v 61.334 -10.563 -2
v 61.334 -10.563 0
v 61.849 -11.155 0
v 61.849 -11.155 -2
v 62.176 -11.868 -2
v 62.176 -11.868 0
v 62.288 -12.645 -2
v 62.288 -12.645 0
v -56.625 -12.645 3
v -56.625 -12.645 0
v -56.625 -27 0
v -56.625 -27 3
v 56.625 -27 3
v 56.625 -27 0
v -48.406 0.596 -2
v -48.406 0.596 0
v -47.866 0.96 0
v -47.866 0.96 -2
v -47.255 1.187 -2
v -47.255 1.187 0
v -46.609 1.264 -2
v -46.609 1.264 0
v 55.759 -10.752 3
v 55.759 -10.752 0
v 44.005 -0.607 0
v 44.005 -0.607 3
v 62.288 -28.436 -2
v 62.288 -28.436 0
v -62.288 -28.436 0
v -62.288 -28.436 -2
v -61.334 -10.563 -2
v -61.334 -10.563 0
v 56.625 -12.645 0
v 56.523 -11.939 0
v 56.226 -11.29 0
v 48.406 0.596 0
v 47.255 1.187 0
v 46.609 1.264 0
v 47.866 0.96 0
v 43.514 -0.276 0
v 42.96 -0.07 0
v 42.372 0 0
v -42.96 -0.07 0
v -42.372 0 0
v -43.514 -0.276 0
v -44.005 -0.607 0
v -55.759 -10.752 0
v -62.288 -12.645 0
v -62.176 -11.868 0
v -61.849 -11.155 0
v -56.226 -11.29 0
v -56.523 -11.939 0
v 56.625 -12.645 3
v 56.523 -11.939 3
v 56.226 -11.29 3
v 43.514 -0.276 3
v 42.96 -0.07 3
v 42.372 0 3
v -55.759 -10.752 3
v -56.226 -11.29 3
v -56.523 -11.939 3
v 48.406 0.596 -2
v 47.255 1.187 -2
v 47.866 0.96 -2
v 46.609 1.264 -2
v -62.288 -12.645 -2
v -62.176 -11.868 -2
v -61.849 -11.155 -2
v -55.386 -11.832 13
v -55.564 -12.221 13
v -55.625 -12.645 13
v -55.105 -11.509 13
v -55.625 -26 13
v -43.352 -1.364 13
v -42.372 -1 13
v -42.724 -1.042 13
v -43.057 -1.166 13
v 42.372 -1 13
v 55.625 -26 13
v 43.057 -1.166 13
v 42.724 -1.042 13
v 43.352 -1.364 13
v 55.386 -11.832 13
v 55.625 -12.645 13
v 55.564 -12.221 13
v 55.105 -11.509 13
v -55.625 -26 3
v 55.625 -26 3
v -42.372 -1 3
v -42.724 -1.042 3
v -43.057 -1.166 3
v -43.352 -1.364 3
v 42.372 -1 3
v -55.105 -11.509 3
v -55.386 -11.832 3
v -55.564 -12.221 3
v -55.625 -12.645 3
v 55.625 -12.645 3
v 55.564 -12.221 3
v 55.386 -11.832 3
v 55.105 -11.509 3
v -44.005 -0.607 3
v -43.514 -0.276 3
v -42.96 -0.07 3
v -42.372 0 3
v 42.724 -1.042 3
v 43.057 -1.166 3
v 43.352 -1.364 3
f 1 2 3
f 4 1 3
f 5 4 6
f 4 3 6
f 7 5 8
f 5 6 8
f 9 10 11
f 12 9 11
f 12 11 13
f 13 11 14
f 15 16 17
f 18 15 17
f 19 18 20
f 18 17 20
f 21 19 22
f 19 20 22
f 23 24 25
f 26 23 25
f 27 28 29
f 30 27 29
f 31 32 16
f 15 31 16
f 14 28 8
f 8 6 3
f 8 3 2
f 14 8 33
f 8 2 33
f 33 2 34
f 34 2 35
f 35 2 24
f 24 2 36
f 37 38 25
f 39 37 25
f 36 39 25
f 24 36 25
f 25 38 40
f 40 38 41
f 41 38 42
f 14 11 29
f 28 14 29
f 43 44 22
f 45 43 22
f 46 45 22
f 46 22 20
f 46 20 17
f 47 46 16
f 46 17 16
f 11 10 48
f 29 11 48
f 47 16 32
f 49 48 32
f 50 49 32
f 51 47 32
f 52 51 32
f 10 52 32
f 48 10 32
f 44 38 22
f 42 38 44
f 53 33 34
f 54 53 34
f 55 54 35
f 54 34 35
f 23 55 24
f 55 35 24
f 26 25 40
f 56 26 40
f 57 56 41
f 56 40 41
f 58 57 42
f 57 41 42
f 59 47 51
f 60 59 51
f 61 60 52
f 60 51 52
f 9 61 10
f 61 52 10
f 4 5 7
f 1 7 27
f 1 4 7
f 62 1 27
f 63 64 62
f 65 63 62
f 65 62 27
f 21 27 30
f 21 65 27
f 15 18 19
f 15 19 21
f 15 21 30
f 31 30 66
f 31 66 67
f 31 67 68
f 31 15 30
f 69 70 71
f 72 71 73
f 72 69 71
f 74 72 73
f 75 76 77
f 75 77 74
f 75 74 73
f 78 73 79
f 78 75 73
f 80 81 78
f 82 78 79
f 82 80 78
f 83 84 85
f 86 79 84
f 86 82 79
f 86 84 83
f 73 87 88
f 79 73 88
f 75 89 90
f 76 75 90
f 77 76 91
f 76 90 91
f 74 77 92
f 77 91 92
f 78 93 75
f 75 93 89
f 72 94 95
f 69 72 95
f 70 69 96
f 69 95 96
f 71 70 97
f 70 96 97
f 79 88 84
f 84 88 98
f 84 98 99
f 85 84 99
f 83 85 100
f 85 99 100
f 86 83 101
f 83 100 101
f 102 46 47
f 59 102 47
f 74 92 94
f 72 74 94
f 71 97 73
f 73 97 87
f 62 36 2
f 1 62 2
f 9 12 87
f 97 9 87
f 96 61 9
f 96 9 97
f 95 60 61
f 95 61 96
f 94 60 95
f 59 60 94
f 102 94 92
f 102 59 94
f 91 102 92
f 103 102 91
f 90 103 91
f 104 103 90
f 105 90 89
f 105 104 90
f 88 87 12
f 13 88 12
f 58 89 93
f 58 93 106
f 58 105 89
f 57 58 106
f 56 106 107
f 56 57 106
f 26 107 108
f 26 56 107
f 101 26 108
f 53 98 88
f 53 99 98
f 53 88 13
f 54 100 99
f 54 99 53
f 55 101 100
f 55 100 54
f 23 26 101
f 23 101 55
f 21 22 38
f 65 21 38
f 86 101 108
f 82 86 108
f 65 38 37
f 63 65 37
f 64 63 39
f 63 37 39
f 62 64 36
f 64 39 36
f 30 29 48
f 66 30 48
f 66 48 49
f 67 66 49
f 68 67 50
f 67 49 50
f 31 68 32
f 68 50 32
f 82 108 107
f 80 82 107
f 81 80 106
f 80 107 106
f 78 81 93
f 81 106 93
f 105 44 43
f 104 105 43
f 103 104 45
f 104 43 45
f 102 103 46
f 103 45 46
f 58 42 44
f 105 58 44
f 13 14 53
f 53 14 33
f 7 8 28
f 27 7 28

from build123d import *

# Parameters (mm, degrees)
BOSS_EXTRUDE1_DEPTH = 3
BOSS_EXTRUDE4_DEPTH = 10
BOSS_EXTRUDE5_DEPTH = 2


with BuildPart() as part:
    # Sketch2 → Boss-Extrude1 (new body)
    with BuildSketch(Plane(origin=(0, 3, 0), x_dir=(1, 0, 0), z_dir=(0, 0, 1))):
        with BuildLine():
            Line((-56.625, -30), (56.625, -30))
            Line((56.625, -30), (56.625, -15.644630074))
            ThreePointArc((56.625, -15.644630074), (56.398076263, -14.603897494), (55.758500558, -13.752098455))
            Line((55.758500558, -13.752098455), (44.005193779, -3.607468381))
            ThreePointArc((44.005193779, -3.607468381), (43.243091796, -3.156783296), (42.371693222, -3))
            Line((42.371693222, -3), (-42.371693222, -3))
            ThreePointArc((-42.371693222, -3), (-43.243091796, -3.156783296), (-44.005193779, -3.607468381))
            Line((-44.005193779, -3.607468381), (-55.758500558, -13.752098455))
            ThreePointArc((-55.758500558, -13.752098455), (-56.398076263, -14.603897494), (-56.625, -15.644630074))
            Line((-56.625, -15.644630074), (-56.625, -30))
        make_face()
    extrude(amount=BOSS_EXTRUDE1_DEPTH)

    # Sketch5 → Boss-Extrude4 (add)
    with BuildSketch(Plane.XY.offset(3)):
        with BuildLine():
            Line((55.625, -26), (55.625, -12.644630074))
            ThreePointArc((55.625, -12.644630074), (55.488845758, -12.020190526), (55.105100335, -11.509111102))
            Line((55.105100335, -11.509111102), (43.351793556, -1.364481029))
            ThreePointArc((43.351793556, -1.364481029), (42.894532367, -1.094069977), (42.371693222, -1))
            Line((42.371693222, -1), (-42.371693222, -1))
            ThreePointArc((-42.371693222, -1), (-42.894532367, -1.094069977), (-43.351793556, -1.364481029))
            Line((-43.351793556, -1.364481029), (-55.105100335, -11.509111102))
            ThreePointArc((-55.105100335, -11.509111102), (-55.488845758, -12.020190526), (-55.625, -12.644630074))
            Line((-55.625, -12.644630074), (-55.625, -26))
            Line((-55.625, -26), (55.625, -26))
        make_face()
    extrude(amount=BOSS_EXTRUDE4_DEPTH)

    # Sketch6 → Boss-Extrude5 (add)
    with BuildSketch(Plane(origin=(0, 0, 0), x_dir=(-1, 0, 0), z_dir=(0, 0, -1))):
        with BuildLine():
            Line((-62.2875, -12.644630074), (-62.2875, -28.435536993))
            Line((-62.2875, -28.435536993), (62.2875, -28.435536993))
            Line((62.2875, -28.435536993), (62.2875, -12.644630074))
            ThreePointArc((62.2875, -12.644630074), (62.037883889, -11.499824236), (61.334350613, -10.562845293))
            Line((61.334350613, -10.562845293), (48.405713157, 0.596247788))
            ThreePointArc((48.405713157, 0.596247788), (47.567400976, 1.092001382), (46.608862544, 1.264463007))
            Line((46.608862544, 1.264463007), (-46.608862544, 1.264463007))
            ThreePointArc((-46.608862544, 1.264463007), (-47.567400976, 1.092001382), (-48.405713157, 0.596247788))
            Line((-48.405713157, 0.596247788), (-61.334350613, -10.562845293))
            ThreePointArc((-61.334350613, -10.562845293), (-62.037883889, -11.499824236), (-62.2875, -12.644630074))
        make_face()
    extrude(amount=BOSS_EXTRUDE5_DEPTH)


solid = part.part
